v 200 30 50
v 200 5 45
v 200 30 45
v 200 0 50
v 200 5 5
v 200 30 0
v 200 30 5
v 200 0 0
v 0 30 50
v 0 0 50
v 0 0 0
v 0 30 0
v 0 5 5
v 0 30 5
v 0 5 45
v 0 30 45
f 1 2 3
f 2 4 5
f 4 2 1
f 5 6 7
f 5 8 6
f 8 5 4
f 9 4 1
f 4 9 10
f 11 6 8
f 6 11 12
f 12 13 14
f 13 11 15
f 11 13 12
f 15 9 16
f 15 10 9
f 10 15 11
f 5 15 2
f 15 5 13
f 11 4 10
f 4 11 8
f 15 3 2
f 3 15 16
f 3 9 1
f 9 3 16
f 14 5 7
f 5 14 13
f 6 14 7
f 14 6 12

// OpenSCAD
// Beam length
beam_length = 200; // Length of the channel beam

// Channel section dimensions
web_height = 50;   // Height of the web (vertical part)
flange_width = 30; // Width of the flanges (horizontal parts)
thickness = 5;     // Thickness of the material

// Color for the beam
beam_color = [0.6, 0.6, 0.6, 1.0]; // A medium grey color

module channel_beam() {
    color(beam_color) {
        union() {
            // Web (the vertical part)
            // Dimensions: [length, thickness, height]
            cube([beam_length, thickness, web_height]);

            // Top Flange (horizontal part at the top)
            // Positioned at the top of the web, extending outwards
            translate([0, 0, web_height - thickness]) {
                cube([beam_length, flange_width, thickness]);
            }

            // Bottom Flange (horizontal part at the bottom)
            // Positioned at the bottom of the web, extending outwards
            cube([beam_length, flange_width, thickness]);
        }
    }
}

// Render the channel beam
channel_beam();
